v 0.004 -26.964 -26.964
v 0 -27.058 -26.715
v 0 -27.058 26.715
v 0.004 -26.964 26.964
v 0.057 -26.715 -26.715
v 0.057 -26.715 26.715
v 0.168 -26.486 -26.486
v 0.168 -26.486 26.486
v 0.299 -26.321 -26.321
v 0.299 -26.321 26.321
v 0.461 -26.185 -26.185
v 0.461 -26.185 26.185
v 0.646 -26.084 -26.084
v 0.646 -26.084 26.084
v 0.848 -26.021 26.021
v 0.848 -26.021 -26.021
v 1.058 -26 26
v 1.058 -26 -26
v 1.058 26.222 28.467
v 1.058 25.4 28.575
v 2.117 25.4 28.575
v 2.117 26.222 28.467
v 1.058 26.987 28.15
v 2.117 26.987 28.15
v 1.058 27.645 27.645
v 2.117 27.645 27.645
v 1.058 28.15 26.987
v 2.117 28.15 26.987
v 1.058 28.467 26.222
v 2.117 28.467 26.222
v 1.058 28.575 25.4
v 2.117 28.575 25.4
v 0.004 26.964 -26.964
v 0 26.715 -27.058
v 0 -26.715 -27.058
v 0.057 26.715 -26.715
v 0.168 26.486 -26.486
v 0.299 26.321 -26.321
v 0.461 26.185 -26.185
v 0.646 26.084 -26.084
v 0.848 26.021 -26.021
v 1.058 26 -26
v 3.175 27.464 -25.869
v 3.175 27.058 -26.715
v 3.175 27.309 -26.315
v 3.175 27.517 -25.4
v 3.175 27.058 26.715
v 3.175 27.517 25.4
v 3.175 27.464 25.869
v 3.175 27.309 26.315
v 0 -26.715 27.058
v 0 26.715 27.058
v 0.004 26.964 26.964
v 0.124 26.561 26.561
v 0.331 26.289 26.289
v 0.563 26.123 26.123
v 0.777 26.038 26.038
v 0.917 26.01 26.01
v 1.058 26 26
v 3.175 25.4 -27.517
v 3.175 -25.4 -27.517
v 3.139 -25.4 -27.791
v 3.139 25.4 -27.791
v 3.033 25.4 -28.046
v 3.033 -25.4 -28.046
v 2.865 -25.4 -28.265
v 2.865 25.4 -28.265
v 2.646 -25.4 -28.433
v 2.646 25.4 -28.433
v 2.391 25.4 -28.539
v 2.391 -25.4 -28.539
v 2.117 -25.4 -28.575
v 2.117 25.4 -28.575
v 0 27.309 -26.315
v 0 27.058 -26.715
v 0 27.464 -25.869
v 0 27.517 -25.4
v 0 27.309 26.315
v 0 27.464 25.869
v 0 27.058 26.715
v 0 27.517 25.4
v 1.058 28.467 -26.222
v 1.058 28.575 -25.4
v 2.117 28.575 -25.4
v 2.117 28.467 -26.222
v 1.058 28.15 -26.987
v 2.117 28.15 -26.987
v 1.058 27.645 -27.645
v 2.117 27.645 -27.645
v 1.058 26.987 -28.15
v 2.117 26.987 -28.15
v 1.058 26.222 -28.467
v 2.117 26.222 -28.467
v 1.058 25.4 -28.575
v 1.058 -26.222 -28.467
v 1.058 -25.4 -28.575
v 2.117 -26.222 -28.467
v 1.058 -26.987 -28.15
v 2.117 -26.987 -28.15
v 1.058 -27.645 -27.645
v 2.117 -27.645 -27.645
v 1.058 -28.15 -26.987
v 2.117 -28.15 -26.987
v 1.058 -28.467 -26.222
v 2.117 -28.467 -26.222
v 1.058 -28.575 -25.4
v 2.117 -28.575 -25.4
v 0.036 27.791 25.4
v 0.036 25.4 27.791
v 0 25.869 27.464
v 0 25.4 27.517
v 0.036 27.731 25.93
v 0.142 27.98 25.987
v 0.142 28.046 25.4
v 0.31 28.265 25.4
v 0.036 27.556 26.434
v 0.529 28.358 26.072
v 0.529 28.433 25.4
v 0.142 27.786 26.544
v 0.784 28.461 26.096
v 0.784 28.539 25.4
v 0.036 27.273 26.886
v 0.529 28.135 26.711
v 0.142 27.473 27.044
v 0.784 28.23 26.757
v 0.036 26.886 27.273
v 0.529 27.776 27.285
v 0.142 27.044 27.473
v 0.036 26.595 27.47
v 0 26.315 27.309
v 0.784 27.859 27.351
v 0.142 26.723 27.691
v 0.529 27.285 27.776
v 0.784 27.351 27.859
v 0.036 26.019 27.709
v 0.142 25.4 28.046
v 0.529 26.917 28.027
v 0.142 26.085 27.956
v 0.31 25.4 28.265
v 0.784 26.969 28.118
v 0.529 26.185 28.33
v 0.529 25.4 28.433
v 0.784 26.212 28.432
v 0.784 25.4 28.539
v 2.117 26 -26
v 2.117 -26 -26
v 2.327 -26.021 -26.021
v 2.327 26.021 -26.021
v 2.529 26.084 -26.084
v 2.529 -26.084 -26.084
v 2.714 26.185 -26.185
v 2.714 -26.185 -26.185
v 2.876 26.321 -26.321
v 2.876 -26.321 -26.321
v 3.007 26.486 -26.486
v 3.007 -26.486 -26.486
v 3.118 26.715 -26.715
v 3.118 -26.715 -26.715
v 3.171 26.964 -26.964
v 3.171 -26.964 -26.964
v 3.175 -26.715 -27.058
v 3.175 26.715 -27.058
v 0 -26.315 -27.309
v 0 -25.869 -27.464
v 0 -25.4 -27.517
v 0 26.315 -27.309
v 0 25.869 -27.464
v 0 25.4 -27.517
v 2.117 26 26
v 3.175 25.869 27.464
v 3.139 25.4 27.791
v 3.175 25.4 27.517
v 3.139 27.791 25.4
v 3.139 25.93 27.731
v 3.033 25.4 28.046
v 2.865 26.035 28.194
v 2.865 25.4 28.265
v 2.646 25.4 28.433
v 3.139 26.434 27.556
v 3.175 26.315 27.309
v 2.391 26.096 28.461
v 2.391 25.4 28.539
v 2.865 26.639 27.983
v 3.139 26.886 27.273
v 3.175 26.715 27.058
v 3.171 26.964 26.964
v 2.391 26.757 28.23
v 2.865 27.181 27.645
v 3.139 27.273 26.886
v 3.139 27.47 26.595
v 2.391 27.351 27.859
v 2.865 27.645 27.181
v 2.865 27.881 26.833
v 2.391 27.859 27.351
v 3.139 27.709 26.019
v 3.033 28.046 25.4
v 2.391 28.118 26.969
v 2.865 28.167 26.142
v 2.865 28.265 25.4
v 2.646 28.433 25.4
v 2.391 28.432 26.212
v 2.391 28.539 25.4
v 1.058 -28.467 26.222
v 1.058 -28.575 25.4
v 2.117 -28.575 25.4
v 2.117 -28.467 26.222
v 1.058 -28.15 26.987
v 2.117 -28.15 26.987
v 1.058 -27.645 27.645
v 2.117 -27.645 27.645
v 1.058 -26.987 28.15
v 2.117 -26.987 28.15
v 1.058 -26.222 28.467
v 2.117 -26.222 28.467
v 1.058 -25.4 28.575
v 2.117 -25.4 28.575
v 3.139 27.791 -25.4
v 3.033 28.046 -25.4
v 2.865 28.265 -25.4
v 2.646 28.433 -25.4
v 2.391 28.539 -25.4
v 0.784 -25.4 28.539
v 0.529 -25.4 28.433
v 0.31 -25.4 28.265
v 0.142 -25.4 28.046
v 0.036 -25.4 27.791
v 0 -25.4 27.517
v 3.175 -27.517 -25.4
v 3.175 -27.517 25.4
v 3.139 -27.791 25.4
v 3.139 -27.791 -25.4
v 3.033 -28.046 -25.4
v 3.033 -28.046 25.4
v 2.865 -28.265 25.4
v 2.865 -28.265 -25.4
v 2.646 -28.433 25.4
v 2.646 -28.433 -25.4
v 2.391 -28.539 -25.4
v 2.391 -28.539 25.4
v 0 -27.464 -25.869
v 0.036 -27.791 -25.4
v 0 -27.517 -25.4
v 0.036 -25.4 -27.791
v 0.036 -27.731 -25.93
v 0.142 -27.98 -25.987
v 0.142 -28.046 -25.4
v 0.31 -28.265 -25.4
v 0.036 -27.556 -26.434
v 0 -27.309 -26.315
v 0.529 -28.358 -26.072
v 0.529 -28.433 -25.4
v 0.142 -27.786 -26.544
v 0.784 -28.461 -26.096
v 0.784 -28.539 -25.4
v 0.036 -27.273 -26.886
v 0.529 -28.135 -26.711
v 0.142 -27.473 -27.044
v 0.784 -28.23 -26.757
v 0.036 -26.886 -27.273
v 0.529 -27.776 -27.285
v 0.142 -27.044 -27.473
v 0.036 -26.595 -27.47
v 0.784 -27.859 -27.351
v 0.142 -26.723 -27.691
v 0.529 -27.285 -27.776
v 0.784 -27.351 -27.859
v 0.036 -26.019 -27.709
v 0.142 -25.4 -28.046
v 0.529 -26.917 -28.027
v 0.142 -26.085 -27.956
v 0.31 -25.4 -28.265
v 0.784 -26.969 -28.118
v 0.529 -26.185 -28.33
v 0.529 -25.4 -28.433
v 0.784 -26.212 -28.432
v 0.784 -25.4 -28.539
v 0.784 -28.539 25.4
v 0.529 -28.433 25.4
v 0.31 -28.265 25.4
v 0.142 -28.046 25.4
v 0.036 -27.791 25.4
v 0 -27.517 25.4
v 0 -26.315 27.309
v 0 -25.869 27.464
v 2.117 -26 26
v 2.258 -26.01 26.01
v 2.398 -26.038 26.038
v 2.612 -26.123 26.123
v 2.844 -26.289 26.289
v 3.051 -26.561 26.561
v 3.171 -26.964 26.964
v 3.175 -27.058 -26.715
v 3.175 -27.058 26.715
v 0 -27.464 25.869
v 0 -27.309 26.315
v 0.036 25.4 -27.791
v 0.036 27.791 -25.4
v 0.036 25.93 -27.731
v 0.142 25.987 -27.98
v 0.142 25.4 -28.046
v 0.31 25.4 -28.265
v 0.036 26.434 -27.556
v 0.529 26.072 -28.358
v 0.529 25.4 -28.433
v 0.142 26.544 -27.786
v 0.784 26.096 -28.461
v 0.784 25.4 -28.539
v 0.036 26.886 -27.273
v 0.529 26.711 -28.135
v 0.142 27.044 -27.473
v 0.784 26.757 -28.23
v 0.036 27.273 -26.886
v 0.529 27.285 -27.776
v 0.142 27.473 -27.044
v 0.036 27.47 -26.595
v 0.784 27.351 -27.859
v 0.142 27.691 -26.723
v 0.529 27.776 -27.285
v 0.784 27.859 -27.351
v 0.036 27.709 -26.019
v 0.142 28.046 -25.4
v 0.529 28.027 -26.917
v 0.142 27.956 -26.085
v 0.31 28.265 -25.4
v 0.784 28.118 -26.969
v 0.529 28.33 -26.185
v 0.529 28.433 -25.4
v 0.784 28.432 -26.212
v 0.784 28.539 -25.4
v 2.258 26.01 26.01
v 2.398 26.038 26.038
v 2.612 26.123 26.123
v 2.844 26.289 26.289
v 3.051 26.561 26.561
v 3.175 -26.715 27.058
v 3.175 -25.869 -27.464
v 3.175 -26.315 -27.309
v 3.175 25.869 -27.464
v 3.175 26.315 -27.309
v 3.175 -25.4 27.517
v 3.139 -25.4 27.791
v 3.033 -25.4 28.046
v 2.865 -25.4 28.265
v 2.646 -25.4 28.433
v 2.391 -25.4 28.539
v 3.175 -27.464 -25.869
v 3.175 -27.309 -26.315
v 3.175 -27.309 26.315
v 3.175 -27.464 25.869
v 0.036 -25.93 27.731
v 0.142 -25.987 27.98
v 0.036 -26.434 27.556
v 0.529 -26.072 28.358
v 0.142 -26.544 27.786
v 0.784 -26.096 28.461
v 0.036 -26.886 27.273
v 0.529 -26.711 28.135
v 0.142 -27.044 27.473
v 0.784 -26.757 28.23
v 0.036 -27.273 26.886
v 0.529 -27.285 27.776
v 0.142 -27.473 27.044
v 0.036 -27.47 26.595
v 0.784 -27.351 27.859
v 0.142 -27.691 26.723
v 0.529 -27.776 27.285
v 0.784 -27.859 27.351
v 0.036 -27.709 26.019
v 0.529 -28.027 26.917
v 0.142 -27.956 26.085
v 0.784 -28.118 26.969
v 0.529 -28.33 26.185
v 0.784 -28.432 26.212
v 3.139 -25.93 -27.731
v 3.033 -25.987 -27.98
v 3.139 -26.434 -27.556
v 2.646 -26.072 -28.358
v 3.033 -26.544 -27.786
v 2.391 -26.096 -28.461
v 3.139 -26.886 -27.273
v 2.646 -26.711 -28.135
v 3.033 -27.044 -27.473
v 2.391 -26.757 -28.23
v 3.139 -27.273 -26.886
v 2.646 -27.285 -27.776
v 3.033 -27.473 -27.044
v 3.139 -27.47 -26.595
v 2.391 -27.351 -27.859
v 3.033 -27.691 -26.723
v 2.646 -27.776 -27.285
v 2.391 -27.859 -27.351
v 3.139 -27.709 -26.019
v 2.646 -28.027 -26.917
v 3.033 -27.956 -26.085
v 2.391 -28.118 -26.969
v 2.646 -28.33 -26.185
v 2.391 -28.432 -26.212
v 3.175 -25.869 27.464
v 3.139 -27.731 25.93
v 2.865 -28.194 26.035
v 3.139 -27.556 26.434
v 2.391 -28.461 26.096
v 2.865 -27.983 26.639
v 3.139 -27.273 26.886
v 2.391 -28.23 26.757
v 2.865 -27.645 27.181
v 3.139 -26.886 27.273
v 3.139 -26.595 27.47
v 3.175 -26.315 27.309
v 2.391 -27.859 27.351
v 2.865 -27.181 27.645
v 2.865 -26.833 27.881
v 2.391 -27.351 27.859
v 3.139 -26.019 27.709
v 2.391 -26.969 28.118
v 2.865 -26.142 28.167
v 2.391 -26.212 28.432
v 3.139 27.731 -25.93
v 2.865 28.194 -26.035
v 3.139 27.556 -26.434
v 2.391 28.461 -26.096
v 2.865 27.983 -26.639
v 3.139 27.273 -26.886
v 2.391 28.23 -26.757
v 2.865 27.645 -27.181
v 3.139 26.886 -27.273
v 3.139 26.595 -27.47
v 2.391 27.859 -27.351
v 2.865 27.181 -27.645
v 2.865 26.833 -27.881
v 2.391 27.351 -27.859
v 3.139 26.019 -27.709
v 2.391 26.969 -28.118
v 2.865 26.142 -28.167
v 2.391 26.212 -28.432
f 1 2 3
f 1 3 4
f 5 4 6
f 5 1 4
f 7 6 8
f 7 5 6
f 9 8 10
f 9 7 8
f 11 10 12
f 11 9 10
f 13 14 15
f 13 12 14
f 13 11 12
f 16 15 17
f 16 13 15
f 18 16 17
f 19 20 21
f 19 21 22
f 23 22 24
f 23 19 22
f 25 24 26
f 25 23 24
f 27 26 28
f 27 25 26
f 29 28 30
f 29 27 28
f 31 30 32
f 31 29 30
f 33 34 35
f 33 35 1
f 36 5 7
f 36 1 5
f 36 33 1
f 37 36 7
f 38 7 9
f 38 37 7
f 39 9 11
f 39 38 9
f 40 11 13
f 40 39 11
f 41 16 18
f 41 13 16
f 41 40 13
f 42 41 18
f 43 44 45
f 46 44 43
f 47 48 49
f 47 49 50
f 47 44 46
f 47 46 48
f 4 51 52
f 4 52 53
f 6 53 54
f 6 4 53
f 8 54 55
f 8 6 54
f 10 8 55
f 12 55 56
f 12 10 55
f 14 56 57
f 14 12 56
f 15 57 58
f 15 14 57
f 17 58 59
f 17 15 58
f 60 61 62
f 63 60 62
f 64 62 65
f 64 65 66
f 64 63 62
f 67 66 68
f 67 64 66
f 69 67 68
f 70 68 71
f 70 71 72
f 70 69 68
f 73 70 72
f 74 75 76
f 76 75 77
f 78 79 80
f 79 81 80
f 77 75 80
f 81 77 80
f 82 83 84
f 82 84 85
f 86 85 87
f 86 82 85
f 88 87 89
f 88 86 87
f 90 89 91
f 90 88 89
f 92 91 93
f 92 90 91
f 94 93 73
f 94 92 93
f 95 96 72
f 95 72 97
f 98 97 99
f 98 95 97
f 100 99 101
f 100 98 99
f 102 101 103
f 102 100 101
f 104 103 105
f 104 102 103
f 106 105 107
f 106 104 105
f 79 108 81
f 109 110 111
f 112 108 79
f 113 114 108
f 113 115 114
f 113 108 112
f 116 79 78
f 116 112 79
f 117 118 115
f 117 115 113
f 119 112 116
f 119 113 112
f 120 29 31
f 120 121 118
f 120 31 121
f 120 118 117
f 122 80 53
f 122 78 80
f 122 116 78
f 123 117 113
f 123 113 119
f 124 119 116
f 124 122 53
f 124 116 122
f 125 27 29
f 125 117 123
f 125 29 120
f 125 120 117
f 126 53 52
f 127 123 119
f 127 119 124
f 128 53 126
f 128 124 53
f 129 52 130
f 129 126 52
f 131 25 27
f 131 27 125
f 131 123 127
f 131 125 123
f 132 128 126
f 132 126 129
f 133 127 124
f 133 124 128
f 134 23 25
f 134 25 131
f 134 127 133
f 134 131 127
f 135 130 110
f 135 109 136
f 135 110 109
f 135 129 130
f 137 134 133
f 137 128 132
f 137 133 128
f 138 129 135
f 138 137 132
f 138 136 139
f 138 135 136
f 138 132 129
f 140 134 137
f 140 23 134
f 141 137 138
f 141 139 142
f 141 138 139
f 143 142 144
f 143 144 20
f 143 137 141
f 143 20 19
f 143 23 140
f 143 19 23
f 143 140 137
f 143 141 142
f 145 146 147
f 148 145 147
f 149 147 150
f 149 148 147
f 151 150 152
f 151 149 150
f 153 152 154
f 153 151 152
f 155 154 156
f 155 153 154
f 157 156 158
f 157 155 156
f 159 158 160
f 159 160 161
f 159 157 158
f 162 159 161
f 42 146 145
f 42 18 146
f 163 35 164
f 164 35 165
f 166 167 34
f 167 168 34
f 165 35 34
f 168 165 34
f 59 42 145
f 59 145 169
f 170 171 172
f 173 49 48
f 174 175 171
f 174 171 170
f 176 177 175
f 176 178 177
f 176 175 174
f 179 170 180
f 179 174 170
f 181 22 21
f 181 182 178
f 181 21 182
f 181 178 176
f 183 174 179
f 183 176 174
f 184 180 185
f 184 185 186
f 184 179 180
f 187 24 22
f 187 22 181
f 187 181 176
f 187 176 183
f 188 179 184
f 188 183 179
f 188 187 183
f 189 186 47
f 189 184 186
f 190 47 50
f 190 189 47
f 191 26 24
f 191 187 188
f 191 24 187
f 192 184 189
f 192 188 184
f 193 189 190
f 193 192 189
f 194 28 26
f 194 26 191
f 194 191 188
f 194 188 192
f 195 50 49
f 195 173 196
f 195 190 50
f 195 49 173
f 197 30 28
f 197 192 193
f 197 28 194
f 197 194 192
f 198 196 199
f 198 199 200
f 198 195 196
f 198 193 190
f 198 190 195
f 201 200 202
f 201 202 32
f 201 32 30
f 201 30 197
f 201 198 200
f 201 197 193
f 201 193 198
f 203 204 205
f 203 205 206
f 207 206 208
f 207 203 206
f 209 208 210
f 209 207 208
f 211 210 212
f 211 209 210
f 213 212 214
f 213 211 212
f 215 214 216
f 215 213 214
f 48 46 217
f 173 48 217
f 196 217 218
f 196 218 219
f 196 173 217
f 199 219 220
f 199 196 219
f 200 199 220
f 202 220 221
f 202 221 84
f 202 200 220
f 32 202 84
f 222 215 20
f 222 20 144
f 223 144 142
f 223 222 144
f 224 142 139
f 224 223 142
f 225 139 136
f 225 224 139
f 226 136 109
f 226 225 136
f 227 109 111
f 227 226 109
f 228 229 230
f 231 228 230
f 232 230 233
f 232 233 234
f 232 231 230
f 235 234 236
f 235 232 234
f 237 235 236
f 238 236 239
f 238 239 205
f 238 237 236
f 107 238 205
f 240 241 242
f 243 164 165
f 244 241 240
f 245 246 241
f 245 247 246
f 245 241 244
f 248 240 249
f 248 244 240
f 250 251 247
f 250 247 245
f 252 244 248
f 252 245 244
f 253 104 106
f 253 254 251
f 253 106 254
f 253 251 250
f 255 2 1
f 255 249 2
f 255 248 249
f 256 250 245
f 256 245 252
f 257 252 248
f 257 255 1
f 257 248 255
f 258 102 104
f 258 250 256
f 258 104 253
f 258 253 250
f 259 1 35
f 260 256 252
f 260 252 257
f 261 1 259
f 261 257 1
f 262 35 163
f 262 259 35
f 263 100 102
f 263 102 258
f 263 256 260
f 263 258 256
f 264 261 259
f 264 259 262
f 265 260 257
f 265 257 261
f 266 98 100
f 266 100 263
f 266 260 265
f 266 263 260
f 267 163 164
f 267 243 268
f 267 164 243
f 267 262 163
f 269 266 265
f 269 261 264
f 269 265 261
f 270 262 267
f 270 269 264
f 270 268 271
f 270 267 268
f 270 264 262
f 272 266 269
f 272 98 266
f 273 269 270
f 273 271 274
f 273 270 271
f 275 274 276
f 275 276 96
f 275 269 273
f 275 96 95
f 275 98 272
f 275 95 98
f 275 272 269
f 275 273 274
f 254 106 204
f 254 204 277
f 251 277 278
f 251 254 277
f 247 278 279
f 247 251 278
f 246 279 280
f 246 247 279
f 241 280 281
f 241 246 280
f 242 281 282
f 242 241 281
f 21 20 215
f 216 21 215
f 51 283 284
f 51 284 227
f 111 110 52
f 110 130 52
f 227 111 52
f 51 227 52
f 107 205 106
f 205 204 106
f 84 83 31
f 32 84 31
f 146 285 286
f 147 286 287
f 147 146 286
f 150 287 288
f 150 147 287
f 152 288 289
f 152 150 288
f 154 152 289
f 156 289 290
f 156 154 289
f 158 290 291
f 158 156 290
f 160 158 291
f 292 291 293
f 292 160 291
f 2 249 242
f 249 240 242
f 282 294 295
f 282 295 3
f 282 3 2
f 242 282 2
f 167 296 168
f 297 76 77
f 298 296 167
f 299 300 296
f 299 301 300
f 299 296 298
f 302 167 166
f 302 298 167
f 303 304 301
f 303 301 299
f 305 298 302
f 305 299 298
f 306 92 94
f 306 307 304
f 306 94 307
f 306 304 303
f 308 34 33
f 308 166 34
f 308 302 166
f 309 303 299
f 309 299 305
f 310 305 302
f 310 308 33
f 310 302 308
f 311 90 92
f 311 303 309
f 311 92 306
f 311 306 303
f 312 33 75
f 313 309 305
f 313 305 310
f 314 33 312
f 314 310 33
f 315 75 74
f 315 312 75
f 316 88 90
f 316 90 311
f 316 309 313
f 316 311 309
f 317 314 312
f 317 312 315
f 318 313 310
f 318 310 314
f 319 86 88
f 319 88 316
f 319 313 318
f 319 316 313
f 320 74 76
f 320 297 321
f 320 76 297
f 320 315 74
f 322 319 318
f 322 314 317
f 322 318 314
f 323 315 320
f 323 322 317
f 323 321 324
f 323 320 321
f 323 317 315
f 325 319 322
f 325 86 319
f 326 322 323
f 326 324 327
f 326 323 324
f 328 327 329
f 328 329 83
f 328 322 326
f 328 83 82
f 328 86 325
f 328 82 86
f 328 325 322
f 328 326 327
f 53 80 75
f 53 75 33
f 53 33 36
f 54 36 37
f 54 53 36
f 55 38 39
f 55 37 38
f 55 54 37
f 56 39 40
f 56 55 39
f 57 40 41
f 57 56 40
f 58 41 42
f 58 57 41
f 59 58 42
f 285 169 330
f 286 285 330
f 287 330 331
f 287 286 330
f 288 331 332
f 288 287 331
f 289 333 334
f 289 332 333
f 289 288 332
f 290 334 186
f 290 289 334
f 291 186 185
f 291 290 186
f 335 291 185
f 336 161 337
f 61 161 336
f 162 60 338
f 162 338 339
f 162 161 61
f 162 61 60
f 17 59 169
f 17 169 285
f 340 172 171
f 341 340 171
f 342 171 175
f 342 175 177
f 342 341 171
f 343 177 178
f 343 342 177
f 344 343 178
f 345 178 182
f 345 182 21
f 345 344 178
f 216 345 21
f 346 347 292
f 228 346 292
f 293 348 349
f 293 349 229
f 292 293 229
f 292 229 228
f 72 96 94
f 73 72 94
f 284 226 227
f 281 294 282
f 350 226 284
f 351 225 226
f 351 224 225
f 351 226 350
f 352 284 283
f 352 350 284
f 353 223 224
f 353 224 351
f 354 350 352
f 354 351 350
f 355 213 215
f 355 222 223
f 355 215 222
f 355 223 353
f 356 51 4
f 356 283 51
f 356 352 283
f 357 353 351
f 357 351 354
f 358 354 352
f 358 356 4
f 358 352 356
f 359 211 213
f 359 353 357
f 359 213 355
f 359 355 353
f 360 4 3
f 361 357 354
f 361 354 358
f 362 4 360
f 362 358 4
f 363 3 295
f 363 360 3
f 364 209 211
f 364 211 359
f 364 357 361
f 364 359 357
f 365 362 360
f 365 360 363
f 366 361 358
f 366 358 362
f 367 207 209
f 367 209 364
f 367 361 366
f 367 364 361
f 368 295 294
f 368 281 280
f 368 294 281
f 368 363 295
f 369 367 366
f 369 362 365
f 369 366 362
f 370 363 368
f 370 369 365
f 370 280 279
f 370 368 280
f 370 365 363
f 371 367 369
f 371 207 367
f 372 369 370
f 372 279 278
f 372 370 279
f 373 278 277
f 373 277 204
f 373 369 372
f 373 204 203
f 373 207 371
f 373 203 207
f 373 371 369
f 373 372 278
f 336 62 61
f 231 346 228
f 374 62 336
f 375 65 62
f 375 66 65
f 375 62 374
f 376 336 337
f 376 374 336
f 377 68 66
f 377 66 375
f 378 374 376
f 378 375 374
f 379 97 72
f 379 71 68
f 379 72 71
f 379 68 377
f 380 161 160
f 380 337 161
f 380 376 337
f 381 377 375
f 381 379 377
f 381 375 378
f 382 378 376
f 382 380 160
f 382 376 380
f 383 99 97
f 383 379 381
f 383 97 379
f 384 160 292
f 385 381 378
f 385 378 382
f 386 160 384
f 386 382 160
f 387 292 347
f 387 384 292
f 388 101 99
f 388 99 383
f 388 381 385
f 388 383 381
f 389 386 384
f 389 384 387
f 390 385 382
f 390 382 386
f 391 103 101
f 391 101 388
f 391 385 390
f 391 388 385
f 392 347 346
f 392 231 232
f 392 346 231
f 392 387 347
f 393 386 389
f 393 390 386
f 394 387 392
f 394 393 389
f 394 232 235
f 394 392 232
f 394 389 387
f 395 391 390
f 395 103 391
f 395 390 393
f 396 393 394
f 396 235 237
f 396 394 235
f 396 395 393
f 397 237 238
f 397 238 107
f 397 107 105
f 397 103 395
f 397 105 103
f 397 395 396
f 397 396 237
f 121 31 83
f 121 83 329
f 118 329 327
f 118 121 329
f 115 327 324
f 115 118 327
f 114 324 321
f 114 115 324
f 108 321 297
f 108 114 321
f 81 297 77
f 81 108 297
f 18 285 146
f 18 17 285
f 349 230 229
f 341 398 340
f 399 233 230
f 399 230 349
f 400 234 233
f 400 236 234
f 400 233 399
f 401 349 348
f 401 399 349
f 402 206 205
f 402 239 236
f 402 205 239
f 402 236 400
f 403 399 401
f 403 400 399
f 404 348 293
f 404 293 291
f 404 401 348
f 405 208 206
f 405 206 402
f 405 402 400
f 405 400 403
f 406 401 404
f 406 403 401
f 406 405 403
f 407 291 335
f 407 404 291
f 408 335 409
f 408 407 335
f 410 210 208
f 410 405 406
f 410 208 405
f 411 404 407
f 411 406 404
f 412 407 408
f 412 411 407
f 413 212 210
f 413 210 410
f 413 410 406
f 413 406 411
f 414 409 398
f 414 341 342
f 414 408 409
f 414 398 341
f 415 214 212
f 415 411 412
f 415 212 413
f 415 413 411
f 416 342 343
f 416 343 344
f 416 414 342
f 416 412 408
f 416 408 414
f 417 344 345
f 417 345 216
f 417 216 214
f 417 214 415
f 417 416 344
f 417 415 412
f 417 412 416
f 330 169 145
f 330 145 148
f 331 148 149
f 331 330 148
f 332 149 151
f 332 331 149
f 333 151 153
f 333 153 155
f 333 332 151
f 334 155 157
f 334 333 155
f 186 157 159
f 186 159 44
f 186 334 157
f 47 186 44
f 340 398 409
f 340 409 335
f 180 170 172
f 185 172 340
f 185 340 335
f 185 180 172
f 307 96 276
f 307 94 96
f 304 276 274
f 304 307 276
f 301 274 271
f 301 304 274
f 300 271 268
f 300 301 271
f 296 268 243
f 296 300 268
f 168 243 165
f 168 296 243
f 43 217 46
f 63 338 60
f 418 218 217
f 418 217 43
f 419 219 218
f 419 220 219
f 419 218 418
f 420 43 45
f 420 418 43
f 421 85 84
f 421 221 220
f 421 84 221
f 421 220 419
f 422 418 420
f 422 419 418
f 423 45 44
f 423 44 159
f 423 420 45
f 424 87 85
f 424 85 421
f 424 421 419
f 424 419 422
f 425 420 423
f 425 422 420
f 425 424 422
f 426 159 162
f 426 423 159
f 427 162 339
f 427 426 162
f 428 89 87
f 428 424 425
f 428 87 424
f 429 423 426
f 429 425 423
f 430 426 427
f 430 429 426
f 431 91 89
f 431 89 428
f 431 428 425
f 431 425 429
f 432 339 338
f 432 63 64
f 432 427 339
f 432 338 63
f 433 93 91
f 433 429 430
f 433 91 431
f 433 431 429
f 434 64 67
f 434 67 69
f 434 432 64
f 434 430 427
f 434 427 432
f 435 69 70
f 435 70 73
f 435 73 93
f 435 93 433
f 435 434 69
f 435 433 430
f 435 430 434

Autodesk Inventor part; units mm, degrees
ref_plane "YZ Plane" through (0, 0, 0) normal (1, 0, 0) x (0, 1, 0)
ref_plane "XZ Plane" through (0, 0, 0) normal (0, 1, 0) x (-1, 0, 0)
ref_plane "XY Plane" through (0, 0, 0) normal (0, 0, 1) x (1, 0, 0)
sketch "Sketch1" plane through (0, 0, 0) normal (1, 0, 0) x (0, 1, 0)
  line L0 (-26.9875, -26.9875) -> (26.9875, -26.9875)
  line L1 (26.9875, -26.9875) -> (26.9875, 26.9875)
  line L2 (26.9875, 26.9875) -> (-26.9875, 26.9875)
  line L3 (-26.9875, 26.9875) -> (-26.9875, -26.9875)
  line L4 (-26.9875, -26.9875) -> (26.9875, 26.9875) construction
  line L5 (26.9875, -26.9875) -> (-26.9875, 26.9875) construction
  line L6 (-26, -26) -> (26, -26)
  line L7 (26, -26) -> (26, 26)
  line L8 (26, 26) -> (-26, 26)
  line L9 (-26, 26) -> (-26, -26)
  line L10 (-26, -26) -> (26, 26) construction
  line L11 (26, -26) -> (-26, 26) construction
  line L12 (-28.575, -28.575) -> (28.575, -28.575)
  line L13 (28.575, -28.575) -> (28.575, 28.575)
  line L14 (28.575, 28.575) -> (-28.575, 28.575)
  line L15 (-28.575, 28.575) -> (-28.575, -28.575)
  line L16 (-28.575, -28.575) -> (28.575, 28.575) construction
  line L17 (28.575, -28.575) -> (-28.575, 28.575) construction
  point P0 (0, 0)
  dimension "d0" = 53.975
  dimension "d1" = 53.975
  dimension "d2" = 52
  dimension "d3" = 52
  dimension "d4" = 1.5875
  dimension "d5" = 1.5875
extrude "Extrusion1" add sketch "Sketch1" along normal blind 3.175 contours L3 L2 L1 L0 | L15 L14 L13 L12
fillet "Fillet1" radius 1.0583 16 edges at (3.175, 0, 28.575) (3.175, 0, 26) (0, 0, 28.575) (3.175, 28.575, 0) (3.175, 26, 0) (3.175, -26, 0) (0, -26, 0) (3.175, -28.575, 0) (0, -28.575, 0) (3.175, 0, -26) (0, 0, -26) (3.175, 0, -28.575) (0, 28.575, 0) (0, 0, -28.575) (0, 0, 26) (0, 26, 0)
fillet "Fillet2" radius 3.175 12 edges at (2.865, 28.265, 28.265) (0.31, 28.265, 28.265) (1.5875, 28.575, 28.575) (2.865, 28.265, -28.265) (0.31, 28.265, -28.265) (1.5875, 28.575, -28.575) (1.5875, -28.575, -28.575) (0.31, -28.265, -28.265) (2.865, -28.265, -28.265) (2.865, -28.265, 28.265) (0.31, -28.265, 28.265) (1.5875, -28.575, 28.575)
equation "\"d0\" = sensorHolderSensorWidth"
equation "\"d1\" = sensorHolderSensorHeight"
equation "\"d2\" = detectorWidth"
equation "\"d3\" = detectorHeight"
equation "\"d4\" = 0.5 * oRingWidth"
equation "\"d5\" = 0.5 * oRingWidth"
equation "\"d6\" = sensorHolderORing"
equation "\"d8\" = 0.333333 * oRingWidth"
equation "\"d9\" = oRingWidth"
equation "\"acrylicThickness\" = 6.35"
equation "\"height\" = 101.6"
equation "\"width\" = 101.6"
equation "\"depth\" = 101.6"
equation "\"mirrorAngle\" = 5deg"
equation "\"detectorWidth\" = 52"
equation "\"detectorHeight\" = 52"
equation "\"mirrorThickness\" = 3"
equation "\"fresnelThickness\" = 0.1"
equation "\"focalLength\" = 76.2"
equation "\"ior\" = 1.49"
equation "\"centerThickness\" = 1.524"
equation "\"fresnelAngle\" = 90deg"
equation "\"fresnelEffectiveDiameter\" = 76.2"
equation "\"mirrorSuppourtWidth\" = 38.1"
equation "\"backGrooveBit\" = 4.8006"
equation "\"sensorHolderWidth\" = 88.9"
equation "\"sensorHolderHeight\" = 88.9"
equation "\"sensorHolderSensorHeight\" = 53.975"
equation "\"sensorHolderSensorWidth\" = 53.975"
equation "\"sensorHolderORingGroove\" = 3.175"
equation "\"sensorHolderORing\" = 3.175"
equation "\"sensorHolderFlushORing\" = 3.175"
equation "\"sensorHolderFlushORingID\" = 304.8"
equation "\"sensorHolderORingID\" = 203.2"
equation "\"oRingWidth\" = 3.175"
equation "\"frontBackORingID\" = 419.1"
equation "\"topBottomHorizontalMirrorGroove\" = 12.7"
equation "\"backMirrorGroove\" = 6.35"
equation "\"mirrorGroove\" = 19.05"
equation "\"mirrorGrooveFillet\" = 6.35"
equation "\"fresnelChamfer\" = 6.35"
equation "\"mirrorGrooveDrill\" = 6.35"
equation "\"mirrorGrooveMill\" = 3.175"
equation "\"fresnelMirrorChamfer\" = 6.35"
equation "\"detectorOpeningWidth\" = 76.2"
equation "\"detectorOpeningHeight\" = 76.2"
properties part number "sensorORing" material "Rubber"
